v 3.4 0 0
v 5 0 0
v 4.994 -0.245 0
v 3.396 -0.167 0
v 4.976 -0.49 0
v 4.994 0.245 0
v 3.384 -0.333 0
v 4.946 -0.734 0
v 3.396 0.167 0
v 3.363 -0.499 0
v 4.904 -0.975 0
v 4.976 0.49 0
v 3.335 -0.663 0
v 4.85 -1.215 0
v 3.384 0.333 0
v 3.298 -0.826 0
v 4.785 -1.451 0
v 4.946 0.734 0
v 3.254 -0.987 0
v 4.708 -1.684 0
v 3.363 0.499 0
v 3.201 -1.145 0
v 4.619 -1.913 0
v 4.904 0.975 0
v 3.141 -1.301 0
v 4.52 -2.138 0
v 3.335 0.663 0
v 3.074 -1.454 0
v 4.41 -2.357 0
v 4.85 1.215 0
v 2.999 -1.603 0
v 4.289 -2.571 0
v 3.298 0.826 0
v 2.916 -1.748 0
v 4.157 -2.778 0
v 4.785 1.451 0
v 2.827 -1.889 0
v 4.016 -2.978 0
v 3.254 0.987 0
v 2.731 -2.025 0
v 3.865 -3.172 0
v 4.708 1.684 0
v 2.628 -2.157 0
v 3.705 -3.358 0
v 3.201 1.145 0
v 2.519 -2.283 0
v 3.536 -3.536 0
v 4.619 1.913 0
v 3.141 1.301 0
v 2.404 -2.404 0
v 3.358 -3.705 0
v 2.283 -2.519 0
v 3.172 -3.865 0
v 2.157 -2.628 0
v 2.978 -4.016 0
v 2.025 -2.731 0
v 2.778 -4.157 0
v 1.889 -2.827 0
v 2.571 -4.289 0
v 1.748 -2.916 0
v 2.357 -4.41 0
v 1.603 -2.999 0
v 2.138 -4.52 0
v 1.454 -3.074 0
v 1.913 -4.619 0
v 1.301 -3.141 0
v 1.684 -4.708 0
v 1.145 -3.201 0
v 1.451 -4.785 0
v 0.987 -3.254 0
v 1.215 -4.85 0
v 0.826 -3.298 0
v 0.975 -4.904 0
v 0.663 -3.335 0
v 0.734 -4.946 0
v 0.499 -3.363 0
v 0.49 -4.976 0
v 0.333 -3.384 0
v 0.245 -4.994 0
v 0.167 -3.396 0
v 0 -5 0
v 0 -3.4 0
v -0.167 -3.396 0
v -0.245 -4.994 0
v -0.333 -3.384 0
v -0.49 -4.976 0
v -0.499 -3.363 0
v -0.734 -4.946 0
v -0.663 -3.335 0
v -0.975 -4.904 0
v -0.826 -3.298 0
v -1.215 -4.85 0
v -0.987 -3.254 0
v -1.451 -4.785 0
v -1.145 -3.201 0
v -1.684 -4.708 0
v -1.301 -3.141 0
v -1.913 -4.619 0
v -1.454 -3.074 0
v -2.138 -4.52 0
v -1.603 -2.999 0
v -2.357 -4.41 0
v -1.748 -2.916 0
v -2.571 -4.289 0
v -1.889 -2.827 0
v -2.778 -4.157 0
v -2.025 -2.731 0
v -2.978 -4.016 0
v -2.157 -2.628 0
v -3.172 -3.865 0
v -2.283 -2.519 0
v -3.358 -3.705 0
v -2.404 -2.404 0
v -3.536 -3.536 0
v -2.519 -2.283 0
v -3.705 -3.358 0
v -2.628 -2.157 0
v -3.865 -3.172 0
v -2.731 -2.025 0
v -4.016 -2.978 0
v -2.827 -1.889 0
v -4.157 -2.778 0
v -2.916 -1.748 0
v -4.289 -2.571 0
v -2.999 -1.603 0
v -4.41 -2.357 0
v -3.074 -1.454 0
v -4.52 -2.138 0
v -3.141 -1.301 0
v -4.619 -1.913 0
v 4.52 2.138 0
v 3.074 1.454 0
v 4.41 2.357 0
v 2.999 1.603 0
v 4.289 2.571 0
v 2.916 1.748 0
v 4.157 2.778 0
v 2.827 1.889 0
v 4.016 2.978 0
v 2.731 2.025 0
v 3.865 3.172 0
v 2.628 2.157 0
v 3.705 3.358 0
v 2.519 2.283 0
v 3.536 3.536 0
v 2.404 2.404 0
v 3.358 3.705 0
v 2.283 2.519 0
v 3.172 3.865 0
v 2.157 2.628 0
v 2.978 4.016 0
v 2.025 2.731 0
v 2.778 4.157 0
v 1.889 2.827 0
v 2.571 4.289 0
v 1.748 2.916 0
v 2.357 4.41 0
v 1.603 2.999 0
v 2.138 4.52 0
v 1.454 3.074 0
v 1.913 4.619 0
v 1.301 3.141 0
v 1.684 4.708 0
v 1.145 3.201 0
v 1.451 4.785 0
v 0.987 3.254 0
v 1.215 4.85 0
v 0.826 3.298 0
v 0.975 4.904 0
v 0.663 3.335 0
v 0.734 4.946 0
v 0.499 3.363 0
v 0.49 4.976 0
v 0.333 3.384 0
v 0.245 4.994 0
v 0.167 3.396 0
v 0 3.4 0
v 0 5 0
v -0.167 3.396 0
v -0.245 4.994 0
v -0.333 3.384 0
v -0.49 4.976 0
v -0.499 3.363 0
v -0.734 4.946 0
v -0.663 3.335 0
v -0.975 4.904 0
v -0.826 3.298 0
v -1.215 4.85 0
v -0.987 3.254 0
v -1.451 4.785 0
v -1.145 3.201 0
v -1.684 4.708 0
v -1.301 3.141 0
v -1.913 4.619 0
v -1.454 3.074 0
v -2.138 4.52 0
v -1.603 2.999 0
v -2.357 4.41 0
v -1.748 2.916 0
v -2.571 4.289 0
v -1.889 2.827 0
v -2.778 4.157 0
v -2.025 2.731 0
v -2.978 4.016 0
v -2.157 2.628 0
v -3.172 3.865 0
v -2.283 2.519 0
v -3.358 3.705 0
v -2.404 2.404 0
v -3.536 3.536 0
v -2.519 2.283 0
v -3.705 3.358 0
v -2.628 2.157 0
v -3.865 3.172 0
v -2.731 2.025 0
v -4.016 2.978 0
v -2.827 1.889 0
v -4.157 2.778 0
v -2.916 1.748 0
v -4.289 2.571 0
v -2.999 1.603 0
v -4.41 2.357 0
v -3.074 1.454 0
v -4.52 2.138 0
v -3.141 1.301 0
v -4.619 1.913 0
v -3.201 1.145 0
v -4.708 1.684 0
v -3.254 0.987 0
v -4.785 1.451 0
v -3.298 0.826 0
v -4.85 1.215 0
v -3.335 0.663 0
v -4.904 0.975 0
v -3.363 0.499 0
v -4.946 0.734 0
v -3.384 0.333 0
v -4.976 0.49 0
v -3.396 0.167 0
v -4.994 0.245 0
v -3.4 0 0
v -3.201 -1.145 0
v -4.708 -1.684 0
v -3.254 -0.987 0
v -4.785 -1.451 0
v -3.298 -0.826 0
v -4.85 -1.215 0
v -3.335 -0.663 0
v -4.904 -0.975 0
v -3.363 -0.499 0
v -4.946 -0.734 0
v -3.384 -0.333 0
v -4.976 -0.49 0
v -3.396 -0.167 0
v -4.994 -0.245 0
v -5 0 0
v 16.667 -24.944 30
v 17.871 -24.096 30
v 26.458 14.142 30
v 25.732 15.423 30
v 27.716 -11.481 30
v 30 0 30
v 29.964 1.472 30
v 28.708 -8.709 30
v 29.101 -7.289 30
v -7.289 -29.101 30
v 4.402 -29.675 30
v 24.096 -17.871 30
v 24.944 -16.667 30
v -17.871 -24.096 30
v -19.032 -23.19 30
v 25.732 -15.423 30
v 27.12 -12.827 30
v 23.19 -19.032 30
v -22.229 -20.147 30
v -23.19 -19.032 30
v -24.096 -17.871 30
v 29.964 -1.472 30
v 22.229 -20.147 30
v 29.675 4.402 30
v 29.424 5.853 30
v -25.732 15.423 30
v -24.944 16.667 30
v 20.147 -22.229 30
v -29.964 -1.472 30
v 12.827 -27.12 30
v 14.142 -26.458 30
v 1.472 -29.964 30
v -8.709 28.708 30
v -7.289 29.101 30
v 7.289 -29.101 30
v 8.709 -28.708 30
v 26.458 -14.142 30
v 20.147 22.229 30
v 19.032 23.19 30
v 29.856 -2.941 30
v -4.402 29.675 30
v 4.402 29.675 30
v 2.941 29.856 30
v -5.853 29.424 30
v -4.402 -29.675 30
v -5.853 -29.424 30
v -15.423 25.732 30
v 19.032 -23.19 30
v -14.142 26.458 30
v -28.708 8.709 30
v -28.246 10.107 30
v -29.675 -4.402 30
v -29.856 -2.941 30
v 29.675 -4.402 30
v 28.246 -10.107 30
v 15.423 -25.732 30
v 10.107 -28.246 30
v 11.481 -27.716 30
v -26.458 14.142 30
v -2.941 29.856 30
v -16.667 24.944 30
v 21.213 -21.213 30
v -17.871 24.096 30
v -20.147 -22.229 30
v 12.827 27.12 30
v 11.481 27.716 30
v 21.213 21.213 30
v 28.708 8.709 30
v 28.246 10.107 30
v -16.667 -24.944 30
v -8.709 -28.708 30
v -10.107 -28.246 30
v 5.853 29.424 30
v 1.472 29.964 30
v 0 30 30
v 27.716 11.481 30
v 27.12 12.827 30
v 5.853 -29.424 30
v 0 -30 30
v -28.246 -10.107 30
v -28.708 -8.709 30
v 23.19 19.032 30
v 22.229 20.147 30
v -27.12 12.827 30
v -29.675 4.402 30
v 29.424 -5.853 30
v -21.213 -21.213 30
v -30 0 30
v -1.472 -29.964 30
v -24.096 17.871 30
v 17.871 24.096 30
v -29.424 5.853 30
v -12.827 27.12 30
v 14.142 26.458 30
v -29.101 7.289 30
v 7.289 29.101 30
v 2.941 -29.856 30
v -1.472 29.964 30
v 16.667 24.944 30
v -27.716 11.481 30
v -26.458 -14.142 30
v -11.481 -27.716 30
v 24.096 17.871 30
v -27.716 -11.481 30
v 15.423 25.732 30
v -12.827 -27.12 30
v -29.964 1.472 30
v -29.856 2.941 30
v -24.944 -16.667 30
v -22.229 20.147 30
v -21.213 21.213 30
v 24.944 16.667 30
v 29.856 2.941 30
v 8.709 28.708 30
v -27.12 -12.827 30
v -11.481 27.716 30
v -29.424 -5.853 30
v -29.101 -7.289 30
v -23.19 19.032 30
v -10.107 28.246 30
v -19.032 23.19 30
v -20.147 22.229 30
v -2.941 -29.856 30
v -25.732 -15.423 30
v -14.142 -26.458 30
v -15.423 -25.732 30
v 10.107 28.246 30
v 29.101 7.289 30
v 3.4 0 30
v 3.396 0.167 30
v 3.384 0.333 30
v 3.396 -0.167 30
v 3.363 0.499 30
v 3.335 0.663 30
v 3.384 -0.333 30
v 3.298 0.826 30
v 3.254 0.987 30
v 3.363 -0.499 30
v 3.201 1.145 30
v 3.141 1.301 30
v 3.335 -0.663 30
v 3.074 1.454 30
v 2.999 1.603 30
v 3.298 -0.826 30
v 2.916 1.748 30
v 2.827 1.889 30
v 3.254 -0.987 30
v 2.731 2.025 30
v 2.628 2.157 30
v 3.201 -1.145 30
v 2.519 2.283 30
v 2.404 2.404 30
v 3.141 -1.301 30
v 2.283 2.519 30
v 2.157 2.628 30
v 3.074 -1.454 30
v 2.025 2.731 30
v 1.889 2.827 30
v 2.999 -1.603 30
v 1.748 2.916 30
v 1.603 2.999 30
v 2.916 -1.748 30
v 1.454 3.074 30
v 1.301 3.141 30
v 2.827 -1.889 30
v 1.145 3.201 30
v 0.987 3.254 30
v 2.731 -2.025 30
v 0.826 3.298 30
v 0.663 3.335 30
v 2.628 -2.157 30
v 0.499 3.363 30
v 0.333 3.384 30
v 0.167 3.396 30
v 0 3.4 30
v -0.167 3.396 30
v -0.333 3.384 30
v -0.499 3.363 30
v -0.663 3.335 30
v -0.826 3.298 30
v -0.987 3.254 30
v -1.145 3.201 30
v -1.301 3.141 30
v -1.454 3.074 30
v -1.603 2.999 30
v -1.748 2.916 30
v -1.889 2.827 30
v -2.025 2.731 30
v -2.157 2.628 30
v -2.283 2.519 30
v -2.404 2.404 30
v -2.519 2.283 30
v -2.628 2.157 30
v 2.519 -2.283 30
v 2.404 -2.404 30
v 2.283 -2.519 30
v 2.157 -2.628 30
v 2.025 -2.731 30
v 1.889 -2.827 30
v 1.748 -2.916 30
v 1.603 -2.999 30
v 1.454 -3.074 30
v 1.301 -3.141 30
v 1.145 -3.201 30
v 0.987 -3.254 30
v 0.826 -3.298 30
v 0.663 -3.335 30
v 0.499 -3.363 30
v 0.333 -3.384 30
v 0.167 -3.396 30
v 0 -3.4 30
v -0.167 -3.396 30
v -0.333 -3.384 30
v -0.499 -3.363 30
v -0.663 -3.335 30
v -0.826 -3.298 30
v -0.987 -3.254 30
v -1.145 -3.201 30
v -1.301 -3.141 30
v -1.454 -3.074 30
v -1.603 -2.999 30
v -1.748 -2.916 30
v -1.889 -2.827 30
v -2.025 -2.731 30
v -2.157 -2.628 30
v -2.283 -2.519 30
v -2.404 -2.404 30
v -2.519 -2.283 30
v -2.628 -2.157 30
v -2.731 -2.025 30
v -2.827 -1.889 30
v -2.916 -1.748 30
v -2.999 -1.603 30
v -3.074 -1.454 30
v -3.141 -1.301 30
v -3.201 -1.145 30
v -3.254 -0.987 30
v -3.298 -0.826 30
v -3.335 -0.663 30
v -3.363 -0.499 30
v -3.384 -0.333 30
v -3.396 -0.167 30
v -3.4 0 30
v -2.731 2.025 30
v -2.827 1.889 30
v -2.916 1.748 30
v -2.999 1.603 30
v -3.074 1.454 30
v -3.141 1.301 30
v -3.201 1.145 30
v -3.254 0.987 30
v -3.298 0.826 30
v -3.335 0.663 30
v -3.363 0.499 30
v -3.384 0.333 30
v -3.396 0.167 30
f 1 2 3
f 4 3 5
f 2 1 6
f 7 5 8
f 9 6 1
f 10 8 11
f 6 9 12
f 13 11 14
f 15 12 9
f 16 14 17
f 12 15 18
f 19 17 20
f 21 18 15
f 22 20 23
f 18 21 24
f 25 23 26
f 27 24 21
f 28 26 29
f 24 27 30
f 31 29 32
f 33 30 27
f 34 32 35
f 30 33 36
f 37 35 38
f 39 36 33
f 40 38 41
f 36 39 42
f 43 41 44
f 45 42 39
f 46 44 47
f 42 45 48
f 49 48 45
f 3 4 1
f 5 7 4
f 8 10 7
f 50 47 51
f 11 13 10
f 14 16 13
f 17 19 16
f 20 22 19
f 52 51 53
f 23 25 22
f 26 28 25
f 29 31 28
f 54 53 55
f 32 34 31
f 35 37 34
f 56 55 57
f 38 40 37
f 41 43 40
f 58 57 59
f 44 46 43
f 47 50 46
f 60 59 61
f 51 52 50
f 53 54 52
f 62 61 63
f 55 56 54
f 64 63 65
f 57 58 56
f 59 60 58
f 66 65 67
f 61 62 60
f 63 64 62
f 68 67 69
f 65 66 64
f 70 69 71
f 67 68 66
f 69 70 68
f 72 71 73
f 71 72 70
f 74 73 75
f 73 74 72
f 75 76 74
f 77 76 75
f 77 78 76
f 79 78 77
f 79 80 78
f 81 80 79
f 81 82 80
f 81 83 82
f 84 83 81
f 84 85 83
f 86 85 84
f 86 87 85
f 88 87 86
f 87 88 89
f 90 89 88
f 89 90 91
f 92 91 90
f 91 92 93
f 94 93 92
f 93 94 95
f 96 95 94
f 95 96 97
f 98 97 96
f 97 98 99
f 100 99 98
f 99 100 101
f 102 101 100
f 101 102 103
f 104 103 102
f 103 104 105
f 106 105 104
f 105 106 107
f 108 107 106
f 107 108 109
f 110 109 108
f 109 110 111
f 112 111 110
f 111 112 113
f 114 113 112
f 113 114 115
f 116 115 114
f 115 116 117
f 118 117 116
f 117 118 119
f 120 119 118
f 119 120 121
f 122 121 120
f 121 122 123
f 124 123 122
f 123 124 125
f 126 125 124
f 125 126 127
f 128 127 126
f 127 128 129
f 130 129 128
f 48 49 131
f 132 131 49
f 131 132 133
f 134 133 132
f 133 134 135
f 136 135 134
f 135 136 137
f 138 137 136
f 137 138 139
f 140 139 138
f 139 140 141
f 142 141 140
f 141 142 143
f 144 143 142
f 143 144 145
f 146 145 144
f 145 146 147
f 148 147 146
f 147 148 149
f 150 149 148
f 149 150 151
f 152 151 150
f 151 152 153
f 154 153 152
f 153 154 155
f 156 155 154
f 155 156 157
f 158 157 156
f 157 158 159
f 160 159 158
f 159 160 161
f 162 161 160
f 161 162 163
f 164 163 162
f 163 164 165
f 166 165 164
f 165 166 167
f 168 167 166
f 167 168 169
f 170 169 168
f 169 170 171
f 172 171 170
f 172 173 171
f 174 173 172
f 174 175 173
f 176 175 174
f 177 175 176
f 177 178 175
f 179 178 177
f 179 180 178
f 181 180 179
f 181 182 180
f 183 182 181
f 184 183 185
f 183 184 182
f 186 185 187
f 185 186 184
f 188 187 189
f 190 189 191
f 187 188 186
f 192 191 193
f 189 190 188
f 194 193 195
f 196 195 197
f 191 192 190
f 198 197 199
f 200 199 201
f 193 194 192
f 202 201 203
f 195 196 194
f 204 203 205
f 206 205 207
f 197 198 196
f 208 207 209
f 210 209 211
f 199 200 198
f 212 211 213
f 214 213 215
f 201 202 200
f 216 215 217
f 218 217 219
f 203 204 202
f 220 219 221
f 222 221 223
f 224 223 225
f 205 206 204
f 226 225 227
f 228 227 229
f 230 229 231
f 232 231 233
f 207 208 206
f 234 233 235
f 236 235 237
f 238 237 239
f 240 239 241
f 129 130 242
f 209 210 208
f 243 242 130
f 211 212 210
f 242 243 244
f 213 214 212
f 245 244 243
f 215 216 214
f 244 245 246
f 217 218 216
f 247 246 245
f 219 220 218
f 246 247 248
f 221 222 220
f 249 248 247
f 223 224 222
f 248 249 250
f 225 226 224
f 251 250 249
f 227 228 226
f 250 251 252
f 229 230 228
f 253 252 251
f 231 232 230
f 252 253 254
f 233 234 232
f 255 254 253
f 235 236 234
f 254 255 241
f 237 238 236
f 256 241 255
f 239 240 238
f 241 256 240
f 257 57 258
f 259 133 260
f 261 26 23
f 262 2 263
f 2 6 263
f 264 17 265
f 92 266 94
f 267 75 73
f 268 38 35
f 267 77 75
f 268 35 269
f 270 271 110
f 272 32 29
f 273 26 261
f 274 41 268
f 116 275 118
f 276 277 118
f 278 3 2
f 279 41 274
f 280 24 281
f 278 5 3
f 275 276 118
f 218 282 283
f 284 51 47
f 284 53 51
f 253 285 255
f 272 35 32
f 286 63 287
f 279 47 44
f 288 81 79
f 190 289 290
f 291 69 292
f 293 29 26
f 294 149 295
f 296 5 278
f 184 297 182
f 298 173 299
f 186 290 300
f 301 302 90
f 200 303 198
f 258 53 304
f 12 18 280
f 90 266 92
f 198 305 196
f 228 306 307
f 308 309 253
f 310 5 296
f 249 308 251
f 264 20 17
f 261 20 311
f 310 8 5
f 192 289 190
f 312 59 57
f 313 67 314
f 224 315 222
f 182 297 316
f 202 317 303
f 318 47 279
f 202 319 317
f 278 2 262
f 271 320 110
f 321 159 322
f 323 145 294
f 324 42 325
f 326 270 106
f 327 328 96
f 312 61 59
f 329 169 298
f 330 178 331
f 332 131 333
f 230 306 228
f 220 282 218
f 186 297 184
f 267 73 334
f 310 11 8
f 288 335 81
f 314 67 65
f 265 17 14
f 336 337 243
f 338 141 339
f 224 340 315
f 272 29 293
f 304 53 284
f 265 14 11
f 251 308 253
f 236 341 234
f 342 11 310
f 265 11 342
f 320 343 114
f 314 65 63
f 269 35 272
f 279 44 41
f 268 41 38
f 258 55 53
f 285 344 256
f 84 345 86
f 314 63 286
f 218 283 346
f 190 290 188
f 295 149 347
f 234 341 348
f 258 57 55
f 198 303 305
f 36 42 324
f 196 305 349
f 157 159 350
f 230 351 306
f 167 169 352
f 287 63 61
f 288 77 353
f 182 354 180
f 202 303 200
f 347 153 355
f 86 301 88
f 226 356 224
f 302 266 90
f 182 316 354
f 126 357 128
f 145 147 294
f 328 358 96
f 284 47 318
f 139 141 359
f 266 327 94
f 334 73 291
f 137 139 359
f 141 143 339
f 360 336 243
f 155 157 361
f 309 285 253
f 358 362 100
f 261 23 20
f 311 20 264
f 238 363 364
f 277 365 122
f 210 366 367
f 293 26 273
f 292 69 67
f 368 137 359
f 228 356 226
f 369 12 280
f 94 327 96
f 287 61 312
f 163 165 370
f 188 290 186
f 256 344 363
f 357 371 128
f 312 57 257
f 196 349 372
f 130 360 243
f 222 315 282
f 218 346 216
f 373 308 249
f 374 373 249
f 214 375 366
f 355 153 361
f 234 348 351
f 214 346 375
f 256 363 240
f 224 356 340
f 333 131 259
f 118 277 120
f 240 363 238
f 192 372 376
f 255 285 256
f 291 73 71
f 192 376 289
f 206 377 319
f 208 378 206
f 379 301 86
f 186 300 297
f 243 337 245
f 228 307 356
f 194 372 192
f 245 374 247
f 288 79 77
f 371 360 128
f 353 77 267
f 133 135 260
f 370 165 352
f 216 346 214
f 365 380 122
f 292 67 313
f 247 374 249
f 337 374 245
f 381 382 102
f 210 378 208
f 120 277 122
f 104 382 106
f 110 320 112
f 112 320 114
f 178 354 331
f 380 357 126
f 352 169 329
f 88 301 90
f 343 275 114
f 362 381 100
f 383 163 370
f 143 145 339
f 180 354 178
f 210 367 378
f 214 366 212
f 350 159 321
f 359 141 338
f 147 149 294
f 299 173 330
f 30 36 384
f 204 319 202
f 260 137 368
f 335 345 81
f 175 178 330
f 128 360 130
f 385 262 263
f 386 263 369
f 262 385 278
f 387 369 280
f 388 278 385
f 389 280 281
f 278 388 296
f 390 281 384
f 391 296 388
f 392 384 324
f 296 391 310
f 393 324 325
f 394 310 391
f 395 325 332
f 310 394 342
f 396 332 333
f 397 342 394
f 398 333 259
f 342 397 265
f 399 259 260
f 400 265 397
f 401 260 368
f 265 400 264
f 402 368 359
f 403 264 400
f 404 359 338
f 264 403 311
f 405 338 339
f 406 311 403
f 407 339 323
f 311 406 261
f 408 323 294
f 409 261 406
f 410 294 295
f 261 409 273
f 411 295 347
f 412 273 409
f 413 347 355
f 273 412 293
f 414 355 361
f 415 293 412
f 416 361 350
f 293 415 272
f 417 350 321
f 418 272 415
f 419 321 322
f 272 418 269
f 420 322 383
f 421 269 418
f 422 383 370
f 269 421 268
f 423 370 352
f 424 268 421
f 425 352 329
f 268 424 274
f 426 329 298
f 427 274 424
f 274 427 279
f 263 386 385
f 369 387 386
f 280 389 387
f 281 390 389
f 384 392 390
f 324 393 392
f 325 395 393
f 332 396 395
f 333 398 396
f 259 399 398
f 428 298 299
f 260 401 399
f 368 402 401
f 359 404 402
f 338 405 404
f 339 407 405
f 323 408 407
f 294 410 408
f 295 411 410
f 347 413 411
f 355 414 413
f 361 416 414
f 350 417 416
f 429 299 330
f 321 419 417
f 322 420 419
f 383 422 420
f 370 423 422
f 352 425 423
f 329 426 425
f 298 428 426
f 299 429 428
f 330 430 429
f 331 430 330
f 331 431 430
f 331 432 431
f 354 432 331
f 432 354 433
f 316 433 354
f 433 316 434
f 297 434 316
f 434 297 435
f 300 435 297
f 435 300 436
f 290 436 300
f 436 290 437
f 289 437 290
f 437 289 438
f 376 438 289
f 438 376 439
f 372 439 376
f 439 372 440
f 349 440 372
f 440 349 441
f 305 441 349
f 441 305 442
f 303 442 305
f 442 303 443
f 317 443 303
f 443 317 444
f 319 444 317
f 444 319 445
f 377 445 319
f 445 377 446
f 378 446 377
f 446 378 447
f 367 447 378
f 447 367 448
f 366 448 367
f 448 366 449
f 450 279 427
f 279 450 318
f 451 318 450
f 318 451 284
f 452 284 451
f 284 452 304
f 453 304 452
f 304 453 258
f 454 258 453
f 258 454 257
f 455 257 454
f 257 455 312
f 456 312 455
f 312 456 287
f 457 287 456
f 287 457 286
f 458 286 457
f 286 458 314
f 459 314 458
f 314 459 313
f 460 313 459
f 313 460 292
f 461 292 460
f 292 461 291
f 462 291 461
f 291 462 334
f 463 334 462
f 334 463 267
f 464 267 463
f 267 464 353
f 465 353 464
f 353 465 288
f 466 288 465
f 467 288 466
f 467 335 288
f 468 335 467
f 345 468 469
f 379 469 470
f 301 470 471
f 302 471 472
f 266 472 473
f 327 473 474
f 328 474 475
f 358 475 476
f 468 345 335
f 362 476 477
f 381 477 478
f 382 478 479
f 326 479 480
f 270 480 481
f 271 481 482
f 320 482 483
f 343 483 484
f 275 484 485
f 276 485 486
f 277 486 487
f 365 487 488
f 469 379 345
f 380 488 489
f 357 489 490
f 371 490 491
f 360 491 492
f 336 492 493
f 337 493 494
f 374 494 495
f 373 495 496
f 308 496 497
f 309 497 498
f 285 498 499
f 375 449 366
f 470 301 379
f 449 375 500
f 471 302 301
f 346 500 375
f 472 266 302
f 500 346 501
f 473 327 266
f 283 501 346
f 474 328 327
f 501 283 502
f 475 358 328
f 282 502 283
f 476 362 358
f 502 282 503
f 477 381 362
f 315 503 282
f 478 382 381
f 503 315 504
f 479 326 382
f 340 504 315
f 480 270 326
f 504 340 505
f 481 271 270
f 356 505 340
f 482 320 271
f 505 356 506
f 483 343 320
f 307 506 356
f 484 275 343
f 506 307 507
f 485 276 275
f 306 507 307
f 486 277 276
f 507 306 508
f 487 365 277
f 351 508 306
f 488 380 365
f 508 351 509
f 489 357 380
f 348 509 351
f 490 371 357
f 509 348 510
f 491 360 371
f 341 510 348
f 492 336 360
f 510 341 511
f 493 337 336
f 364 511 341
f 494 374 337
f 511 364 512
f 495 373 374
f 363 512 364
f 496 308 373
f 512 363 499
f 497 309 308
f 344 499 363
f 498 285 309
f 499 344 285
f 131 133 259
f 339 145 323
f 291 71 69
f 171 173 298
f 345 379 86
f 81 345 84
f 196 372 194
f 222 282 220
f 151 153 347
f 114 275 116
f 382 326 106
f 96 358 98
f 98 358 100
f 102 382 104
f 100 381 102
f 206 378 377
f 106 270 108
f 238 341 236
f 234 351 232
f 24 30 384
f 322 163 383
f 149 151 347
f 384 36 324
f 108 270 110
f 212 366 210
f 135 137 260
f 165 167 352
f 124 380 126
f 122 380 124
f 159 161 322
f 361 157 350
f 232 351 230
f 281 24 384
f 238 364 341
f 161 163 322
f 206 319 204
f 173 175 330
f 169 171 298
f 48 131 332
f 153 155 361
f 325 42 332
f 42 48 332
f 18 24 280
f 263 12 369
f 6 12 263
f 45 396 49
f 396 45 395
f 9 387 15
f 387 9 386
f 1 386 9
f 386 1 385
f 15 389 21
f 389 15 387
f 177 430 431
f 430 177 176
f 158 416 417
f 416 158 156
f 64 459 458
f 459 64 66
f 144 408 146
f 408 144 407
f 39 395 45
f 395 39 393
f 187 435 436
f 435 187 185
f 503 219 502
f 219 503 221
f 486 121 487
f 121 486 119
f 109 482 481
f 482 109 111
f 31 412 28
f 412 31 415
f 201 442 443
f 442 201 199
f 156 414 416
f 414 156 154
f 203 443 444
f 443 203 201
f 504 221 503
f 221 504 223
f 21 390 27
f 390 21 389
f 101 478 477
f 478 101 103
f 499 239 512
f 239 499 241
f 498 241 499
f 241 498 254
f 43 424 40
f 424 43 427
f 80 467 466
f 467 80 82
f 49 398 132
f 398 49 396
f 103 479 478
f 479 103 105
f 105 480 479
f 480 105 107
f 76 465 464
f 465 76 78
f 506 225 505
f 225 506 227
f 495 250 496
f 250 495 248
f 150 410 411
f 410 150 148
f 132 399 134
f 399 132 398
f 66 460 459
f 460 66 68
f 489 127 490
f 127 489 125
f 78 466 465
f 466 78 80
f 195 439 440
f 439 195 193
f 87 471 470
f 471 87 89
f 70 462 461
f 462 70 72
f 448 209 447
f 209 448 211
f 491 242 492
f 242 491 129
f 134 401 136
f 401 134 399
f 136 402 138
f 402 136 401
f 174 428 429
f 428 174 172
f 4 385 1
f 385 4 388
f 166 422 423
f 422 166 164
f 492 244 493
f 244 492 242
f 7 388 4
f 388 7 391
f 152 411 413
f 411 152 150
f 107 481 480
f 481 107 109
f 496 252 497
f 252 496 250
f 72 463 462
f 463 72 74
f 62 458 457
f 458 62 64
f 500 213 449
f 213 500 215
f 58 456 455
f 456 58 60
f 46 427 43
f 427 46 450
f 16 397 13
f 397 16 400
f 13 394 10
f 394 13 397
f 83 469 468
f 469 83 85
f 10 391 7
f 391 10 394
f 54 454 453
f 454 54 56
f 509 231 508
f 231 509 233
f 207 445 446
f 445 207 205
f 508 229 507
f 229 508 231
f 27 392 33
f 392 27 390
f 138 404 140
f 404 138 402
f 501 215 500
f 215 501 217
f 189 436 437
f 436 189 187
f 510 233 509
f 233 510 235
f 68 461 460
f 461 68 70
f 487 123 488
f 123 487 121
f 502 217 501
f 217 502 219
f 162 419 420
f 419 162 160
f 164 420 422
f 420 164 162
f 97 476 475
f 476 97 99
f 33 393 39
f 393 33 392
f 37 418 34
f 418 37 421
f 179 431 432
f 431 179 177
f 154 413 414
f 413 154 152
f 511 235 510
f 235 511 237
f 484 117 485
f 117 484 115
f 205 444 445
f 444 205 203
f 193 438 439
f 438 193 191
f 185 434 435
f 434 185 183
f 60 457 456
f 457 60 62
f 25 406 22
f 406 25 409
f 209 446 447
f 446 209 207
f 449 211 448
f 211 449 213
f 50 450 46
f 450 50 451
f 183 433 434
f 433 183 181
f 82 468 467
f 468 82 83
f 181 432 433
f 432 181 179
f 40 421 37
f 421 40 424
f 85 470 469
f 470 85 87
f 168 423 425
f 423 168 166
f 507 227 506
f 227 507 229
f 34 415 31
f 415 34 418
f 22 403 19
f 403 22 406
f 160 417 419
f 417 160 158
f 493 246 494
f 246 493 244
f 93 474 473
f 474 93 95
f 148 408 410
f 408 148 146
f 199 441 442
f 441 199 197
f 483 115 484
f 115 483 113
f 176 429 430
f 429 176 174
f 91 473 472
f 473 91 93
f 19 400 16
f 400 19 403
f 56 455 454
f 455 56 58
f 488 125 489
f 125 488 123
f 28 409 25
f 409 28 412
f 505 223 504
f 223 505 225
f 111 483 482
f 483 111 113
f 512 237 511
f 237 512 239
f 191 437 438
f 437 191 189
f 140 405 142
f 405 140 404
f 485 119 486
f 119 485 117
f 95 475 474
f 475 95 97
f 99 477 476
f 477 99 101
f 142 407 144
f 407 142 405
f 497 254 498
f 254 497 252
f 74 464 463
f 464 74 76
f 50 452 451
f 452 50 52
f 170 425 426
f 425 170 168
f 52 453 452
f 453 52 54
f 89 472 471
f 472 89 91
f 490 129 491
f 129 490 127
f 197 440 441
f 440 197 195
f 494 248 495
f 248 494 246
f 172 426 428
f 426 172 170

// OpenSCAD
// Lab funnel - printed upright, wide opening at the top
// All dimensions in mm

// ---- Parameters ----
spout_od      = 10;    // spout outer diameter
spout_length  = 20;    // spout length (z = 0 to z = 20)
cone_bottom_d = 10;    // cone outer diameter at z = 20
cone_top_d    = 60;    // cone outer diameter at rim (z = 50)
rim_z         = 50;    // rim height
wall          = 1.6;   // wall thickness everywhere

$fn = 128;             // smoothness of curved surfaces

// ---- Derived ----
spout_id = spout_od - 2 * wall;   // spout bore (6.8 mm)
cone_h   = rim_z - spout_length;  // cone height (30 mm)

// ---- Model ----
difference() {
    union() {
        // Spout
        cylinder(d = spout_od, h = spout_length);
        // Cone
        cylinder(d1 = cone_bottom_d, d2 = cone_top_d, h = cone_h);
    }
    // Through-bore (extends past both end faces)
    translate([0, 0, -1])
        cylinder(d = spout_id, h = rim_z + 2);
}
